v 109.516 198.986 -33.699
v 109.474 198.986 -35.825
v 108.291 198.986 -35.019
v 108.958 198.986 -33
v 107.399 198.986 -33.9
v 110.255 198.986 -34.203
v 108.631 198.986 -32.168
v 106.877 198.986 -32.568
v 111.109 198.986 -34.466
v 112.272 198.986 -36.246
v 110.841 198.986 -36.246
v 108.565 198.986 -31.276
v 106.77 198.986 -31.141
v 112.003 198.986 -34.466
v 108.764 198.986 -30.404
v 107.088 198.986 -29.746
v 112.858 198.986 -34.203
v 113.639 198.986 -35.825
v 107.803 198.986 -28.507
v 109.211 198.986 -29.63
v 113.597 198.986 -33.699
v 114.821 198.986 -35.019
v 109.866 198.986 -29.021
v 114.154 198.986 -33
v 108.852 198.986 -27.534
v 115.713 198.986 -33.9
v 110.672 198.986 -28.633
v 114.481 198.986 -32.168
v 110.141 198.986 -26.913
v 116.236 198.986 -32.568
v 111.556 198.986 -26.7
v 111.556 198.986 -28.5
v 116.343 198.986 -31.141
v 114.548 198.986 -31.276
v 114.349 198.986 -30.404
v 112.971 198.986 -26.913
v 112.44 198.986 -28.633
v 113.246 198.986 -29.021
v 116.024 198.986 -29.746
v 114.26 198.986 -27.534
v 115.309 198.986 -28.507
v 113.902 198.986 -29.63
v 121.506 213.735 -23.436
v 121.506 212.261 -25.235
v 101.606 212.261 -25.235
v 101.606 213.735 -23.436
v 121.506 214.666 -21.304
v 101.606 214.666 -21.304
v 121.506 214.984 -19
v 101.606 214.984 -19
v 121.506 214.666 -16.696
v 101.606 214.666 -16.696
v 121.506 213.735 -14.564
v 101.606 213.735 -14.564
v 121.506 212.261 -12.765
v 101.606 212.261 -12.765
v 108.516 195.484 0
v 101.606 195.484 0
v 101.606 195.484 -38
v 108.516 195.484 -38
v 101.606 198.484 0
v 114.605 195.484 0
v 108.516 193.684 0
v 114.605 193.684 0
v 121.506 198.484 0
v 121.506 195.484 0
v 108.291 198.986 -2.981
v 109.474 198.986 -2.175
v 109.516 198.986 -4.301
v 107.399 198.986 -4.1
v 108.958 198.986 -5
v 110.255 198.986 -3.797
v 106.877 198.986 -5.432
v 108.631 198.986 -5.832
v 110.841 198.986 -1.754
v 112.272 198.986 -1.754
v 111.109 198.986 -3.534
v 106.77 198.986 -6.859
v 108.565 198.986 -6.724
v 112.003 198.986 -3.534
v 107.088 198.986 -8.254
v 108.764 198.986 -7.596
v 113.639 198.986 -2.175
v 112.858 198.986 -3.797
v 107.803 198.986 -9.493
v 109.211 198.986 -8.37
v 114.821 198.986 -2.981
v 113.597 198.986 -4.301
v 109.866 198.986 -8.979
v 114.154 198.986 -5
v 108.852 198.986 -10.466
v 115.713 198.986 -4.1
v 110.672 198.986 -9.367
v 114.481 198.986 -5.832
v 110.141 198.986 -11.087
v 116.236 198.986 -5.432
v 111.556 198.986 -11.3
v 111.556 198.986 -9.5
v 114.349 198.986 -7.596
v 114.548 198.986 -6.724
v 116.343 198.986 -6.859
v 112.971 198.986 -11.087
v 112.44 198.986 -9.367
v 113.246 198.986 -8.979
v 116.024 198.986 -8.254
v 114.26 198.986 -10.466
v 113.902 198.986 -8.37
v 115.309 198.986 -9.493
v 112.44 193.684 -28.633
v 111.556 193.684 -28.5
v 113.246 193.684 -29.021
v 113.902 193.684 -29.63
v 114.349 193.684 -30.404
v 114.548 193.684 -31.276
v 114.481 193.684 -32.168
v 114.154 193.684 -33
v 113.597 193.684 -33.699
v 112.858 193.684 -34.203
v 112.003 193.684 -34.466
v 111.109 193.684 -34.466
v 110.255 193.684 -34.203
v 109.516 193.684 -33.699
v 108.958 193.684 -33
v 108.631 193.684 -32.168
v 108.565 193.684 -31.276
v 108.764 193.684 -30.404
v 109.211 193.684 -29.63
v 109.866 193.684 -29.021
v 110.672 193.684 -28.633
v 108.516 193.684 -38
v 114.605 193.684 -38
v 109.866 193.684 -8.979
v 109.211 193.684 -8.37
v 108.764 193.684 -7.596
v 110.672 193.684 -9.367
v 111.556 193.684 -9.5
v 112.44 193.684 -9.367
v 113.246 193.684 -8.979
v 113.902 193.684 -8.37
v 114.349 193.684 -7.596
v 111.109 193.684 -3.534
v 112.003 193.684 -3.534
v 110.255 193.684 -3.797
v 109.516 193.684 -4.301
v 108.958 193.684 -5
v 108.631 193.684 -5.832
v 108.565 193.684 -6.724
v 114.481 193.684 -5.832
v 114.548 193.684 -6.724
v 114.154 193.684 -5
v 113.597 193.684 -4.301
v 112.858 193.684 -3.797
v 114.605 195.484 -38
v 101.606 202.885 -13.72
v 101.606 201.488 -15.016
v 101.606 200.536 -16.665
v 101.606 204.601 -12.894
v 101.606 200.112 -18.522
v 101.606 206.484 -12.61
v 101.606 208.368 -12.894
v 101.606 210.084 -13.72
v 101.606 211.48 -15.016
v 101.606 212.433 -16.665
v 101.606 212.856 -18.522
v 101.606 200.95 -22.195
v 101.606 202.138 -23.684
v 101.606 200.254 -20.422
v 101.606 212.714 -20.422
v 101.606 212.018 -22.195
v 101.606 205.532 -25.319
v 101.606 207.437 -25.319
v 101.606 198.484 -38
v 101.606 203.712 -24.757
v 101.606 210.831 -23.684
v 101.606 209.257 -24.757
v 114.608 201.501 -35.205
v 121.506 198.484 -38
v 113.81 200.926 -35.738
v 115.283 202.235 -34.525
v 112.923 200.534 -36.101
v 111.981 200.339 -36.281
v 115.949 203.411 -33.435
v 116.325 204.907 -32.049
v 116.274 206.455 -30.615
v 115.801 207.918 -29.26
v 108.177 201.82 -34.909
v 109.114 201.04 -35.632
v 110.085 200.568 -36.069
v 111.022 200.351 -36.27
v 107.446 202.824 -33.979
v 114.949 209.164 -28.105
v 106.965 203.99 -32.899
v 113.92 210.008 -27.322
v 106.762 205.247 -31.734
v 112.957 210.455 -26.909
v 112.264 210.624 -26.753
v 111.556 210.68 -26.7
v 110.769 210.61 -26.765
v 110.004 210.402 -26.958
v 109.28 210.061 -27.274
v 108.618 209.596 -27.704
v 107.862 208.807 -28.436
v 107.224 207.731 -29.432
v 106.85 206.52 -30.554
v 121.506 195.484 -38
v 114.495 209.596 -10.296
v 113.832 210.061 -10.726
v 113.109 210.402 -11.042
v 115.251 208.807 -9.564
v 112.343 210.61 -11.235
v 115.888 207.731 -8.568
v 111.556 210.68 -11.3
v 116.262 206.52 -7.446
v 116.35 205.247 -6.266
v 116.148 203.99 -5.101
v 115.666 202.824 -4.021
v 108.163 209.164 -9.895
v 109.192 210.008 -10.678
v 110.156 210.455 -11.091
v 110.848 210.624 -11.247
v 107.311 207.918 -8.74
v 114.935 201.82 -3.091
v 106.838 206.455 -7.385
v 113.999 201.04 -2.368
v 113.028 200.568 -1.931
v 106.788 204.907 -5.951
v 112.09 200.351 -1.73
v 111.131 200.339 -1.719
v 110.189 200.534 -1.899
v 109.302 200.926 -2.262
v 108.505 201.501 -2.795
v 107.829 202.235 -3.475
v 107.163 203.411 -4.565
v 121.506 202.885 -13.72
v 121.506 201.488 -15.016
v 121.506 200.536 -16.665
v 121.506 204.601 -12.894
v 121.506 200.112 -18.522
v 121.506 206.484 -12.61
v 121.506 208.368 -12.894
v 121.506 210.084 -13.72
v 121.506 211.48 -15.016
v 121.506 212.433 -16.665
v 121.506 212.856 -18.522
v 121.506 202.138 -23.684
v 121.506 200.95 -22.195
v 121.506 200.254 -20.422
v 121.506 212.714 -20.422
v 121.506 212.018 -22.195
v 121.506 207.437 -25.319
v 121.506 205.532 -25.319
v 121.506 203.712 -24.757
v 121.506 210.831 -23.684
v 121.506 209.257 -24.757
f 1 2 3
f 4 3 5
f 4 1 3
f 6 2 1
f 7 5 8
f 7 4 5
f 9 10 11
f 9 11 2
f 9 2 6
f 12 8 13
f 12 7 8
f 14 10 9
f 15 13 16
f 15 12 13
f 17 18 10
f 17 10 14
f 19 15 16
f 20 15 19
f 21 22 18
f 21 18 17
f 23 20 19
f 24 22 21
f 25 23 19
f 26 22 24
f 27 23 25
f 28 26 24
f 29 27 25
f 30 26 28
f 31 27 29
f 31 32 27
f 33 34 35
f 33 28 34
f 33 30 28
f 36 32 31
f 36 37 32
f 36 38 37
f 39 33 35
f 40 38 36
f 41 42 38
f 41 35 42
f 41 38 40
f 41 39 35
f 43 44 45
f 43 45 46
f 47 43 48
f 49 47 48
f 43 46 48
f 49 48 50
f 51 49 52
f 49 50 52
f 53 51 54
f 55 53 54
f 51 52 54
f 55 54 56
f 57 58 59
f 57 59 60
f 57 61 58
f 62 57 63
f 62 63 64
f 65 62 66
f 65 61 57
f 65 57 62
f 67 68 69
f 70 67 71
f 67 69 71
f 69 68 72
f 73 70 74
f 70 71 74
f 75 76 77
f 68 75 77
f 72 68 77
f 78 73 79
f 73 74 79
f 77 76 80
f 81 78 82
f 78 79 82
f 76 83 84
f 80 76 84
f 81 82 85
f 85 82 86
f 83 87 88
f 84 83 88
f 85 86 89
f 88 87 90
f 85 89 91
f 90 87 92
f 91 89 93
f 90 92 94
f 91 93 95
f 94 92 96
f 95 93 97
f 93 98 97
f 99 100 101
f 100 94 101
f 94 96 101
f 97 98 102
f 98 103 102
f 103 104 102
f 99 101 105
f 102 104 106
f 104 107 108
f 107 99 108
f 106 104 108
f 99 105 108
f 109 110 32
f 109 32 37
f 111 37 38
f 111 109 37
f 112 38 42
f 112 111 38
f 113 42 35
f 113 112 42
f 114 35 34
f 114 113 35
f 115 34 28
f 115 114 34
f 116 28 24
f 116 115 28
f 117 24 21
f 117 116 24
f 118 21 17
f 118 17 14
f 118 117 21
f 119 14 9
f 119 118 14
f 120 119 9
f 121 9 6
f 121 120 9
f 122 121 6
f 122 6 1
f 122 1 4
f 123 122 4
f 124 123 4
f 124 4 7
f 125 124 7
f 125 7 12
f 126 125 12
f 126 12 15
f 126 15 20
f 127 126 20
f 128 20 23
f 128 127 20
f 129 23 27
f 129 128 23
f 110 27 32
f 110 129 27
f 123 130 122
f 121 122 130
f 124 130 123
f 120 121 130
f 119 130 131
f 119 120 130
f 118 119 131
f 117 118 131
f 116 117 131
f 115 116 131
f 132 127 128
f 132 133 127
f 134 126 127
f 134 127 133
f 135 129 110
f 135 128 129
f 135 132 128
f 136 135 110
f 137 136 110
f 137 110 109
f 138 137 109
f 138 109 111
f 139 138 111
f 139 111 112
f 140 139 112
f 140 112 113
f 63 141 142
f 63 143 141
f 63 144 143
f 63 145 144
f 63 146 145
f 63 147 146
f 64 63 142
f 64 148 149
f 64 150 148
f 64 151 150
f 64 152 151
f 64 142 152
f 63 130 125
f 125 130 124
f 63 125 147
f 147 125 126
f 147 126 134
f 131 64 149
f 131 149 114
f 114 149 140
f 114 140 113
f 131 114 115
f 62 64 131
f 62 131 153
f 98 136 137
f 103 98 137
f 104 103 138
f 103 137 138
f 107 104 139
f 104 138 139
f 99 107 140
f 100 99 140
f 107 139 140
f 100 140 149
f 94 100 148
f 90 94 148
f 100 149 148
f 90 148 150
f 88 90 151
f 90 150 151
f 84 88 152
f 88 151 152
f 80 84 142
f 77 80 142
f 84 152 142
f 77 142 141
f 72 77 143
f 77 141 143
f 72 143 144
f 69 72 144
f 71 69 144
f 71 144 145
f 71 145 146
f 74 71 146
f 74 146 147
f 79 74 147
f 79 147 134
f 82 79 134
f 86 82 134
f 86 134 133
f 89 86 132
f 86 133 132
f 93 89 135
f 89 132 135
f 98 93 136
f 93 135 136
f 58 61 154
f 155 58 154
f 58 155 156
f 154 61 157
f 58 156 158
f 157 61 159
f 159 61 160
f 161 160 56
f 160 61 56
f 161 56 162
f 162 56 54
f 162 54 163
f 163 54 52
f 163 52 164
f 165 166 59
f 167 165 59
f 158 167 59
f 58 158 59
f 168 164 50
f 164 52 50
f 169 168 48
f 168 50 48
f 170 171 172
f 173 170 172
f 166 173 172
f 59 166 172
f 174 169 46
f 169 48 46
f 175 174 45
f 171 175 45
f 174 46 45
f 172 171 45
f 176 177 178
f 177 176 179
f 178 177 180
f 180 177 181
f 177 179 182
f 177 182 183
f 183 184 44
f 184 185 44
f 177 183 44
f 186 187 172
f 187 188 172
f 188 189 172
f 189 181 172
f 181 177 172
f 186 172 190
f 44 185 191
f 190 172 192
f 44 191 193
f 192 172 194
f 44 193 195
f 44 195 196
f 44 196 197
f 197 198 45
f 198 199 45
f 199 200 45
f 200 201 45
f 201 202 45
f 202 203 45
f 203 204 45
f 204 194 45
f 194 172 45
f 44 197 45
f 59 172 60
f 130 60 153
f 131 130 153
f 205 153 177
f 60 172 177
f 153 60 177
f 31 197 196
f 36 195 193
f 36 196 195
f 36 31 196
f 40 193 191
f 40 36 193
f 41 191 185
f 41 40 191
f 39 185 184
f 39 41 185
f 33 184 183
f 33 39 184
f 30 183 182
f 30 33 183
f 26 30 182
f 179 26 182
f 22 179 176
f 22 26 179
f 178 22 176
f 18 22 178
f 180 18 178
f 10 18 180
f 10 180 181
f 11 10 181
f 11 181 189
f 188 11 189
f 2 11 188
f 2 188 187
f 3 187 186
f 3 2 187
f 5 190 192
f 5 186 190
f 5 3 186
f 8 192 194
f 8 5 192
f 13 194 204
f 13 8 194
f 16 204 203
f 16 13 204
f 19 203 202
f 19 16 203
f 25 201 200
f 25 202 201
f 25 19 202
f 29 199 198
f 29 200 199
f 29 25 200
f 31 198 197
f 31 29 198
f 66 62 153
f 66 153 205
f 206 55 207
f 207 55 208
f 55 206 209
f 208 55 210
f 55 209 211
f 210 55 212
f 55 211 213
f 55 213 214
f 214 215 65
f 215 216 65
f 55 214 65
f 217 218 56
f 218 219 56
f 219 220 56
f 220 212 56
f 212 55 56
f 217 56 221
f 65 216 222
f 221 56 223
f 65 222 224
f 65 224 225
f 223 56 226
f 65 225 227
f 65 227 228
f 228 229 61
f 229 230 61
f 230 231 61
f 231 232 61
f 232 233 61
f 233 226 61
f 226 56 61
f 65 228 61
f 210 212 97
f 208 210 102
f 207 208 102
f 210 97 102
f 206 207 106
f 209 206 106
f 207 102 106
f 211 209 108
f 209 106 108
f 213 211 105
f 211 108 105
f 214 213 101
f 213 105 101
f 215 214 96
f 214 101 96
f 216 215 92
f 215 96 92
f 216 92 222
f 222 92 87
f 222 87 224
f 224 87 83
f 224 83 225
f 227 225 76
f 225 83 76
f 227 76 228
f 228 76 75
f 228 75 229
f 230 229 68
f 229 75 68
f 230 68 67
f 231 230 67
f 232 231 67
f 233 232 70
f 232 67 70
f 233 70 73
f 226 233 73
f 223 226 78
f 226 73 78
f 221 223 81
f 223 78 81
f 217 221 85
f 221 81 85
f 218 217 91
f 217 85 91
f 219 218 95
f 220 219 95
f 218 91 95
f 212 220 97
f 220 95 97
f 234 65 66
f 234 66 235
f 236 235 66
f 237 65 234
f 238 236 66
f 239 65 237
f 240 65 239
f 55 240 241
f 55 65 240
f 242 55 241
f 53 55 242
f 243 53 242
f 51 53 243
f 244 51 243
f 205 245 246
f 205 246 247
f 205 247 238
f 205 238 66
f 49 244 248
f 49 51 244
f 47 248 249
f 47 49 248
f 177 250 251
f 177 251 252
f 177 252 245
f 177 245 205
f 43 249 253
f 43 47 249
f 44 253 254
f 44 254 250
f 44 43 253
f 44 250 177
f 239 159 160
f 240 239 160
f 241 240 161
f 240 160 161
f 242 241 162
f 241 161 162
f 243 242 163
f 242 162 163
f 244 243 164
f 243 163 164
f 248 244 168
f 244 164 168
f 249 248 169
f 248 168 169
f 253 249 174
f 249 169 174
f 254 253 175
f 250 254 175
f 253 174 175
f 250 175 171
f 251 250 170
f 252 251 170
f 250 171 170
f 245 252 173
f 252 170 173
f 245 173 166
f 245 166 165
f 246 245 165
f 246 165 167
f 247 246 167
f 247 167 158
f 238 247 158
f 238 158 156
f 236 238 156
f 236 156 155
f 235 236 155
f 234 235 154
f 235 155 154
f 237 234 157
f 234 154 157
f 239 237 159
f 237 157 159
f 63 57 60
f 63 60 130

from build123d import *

# Parameters (mm, degrees)
BOSS_EXTRUDE1_DEPTH = 38
SKETCH2_R           = 6.39
BOSS_EXTRUDE2_DEPTH = 19.9


with BuildPart() as part:
    # Sketch1 → Boss-Extrude1 (new body)
    with BuildSketch(Plane.XY):
        Polygon((101.60617691, 195.484265545), (108.51617691, 195.484265545), (108.51617691, 193.684265545), (114.604851948, 193.684265545), (114.604851948, 195.484265545), (121.50617691, 195.484265545), (121.50617691, 198.484265545), (101.60617691, 198.484265545), align=None)
    extrude(amount=-BOSS_EXTRUDE1_DEPTH)

    # Sketch2 → Boss-Extrude2 (add)
    with BuildSketch(Plane.ZY.offset(-101.60617691)):
        with BuildLine():
            Line((-38, 198.484265545), (-25.235062395, 212.261288734))
            ThreePointArc((-25.235062395, 212.261288734), (-19, 214.984265545), (-12.764937605, 212.261288734))
            Line((-12.764937605, 212.261288734), (0, 198.484265545))
            Line((0, 198.484265545), (-38, 198.484265545))
        make_face()
        with Locations((-19, 206.484265545)):
            Circle(SKETCH2_R, mode=Mode.SUBTRACT)
    extrude(amount=-BOSS_EXTRUDE2_DEPTH)

    # Sketch3 → Cut-Revolve1 (revolve, cut)
    with BuildSketch(Plane.ZY.offset(-111.55617691)):
        Polygon((-26.7, 211.670017018), (-26.7, 198.985665545), (-28.5, 198.985665545), (-28.5, 189.906068288), (-31.5, 189.906068288), (-31.5, 211.670017018), align=None)
    cut_revolve1 = revolve(axis=Axis((111.55617691, 189.906068288, -31.5), (0, 1, 0)), mode=Mode.SUBTRACT)

    # Mirror1: Cut-Revolve1 across plane
    add(cut_revolve1.mirror(Plane(origin=(0, 0, -19), x_dir=(1, 0, 0), z_dir=(0, 0, -1))), mode=Mode.SUBTRACT)


solid = part.part
